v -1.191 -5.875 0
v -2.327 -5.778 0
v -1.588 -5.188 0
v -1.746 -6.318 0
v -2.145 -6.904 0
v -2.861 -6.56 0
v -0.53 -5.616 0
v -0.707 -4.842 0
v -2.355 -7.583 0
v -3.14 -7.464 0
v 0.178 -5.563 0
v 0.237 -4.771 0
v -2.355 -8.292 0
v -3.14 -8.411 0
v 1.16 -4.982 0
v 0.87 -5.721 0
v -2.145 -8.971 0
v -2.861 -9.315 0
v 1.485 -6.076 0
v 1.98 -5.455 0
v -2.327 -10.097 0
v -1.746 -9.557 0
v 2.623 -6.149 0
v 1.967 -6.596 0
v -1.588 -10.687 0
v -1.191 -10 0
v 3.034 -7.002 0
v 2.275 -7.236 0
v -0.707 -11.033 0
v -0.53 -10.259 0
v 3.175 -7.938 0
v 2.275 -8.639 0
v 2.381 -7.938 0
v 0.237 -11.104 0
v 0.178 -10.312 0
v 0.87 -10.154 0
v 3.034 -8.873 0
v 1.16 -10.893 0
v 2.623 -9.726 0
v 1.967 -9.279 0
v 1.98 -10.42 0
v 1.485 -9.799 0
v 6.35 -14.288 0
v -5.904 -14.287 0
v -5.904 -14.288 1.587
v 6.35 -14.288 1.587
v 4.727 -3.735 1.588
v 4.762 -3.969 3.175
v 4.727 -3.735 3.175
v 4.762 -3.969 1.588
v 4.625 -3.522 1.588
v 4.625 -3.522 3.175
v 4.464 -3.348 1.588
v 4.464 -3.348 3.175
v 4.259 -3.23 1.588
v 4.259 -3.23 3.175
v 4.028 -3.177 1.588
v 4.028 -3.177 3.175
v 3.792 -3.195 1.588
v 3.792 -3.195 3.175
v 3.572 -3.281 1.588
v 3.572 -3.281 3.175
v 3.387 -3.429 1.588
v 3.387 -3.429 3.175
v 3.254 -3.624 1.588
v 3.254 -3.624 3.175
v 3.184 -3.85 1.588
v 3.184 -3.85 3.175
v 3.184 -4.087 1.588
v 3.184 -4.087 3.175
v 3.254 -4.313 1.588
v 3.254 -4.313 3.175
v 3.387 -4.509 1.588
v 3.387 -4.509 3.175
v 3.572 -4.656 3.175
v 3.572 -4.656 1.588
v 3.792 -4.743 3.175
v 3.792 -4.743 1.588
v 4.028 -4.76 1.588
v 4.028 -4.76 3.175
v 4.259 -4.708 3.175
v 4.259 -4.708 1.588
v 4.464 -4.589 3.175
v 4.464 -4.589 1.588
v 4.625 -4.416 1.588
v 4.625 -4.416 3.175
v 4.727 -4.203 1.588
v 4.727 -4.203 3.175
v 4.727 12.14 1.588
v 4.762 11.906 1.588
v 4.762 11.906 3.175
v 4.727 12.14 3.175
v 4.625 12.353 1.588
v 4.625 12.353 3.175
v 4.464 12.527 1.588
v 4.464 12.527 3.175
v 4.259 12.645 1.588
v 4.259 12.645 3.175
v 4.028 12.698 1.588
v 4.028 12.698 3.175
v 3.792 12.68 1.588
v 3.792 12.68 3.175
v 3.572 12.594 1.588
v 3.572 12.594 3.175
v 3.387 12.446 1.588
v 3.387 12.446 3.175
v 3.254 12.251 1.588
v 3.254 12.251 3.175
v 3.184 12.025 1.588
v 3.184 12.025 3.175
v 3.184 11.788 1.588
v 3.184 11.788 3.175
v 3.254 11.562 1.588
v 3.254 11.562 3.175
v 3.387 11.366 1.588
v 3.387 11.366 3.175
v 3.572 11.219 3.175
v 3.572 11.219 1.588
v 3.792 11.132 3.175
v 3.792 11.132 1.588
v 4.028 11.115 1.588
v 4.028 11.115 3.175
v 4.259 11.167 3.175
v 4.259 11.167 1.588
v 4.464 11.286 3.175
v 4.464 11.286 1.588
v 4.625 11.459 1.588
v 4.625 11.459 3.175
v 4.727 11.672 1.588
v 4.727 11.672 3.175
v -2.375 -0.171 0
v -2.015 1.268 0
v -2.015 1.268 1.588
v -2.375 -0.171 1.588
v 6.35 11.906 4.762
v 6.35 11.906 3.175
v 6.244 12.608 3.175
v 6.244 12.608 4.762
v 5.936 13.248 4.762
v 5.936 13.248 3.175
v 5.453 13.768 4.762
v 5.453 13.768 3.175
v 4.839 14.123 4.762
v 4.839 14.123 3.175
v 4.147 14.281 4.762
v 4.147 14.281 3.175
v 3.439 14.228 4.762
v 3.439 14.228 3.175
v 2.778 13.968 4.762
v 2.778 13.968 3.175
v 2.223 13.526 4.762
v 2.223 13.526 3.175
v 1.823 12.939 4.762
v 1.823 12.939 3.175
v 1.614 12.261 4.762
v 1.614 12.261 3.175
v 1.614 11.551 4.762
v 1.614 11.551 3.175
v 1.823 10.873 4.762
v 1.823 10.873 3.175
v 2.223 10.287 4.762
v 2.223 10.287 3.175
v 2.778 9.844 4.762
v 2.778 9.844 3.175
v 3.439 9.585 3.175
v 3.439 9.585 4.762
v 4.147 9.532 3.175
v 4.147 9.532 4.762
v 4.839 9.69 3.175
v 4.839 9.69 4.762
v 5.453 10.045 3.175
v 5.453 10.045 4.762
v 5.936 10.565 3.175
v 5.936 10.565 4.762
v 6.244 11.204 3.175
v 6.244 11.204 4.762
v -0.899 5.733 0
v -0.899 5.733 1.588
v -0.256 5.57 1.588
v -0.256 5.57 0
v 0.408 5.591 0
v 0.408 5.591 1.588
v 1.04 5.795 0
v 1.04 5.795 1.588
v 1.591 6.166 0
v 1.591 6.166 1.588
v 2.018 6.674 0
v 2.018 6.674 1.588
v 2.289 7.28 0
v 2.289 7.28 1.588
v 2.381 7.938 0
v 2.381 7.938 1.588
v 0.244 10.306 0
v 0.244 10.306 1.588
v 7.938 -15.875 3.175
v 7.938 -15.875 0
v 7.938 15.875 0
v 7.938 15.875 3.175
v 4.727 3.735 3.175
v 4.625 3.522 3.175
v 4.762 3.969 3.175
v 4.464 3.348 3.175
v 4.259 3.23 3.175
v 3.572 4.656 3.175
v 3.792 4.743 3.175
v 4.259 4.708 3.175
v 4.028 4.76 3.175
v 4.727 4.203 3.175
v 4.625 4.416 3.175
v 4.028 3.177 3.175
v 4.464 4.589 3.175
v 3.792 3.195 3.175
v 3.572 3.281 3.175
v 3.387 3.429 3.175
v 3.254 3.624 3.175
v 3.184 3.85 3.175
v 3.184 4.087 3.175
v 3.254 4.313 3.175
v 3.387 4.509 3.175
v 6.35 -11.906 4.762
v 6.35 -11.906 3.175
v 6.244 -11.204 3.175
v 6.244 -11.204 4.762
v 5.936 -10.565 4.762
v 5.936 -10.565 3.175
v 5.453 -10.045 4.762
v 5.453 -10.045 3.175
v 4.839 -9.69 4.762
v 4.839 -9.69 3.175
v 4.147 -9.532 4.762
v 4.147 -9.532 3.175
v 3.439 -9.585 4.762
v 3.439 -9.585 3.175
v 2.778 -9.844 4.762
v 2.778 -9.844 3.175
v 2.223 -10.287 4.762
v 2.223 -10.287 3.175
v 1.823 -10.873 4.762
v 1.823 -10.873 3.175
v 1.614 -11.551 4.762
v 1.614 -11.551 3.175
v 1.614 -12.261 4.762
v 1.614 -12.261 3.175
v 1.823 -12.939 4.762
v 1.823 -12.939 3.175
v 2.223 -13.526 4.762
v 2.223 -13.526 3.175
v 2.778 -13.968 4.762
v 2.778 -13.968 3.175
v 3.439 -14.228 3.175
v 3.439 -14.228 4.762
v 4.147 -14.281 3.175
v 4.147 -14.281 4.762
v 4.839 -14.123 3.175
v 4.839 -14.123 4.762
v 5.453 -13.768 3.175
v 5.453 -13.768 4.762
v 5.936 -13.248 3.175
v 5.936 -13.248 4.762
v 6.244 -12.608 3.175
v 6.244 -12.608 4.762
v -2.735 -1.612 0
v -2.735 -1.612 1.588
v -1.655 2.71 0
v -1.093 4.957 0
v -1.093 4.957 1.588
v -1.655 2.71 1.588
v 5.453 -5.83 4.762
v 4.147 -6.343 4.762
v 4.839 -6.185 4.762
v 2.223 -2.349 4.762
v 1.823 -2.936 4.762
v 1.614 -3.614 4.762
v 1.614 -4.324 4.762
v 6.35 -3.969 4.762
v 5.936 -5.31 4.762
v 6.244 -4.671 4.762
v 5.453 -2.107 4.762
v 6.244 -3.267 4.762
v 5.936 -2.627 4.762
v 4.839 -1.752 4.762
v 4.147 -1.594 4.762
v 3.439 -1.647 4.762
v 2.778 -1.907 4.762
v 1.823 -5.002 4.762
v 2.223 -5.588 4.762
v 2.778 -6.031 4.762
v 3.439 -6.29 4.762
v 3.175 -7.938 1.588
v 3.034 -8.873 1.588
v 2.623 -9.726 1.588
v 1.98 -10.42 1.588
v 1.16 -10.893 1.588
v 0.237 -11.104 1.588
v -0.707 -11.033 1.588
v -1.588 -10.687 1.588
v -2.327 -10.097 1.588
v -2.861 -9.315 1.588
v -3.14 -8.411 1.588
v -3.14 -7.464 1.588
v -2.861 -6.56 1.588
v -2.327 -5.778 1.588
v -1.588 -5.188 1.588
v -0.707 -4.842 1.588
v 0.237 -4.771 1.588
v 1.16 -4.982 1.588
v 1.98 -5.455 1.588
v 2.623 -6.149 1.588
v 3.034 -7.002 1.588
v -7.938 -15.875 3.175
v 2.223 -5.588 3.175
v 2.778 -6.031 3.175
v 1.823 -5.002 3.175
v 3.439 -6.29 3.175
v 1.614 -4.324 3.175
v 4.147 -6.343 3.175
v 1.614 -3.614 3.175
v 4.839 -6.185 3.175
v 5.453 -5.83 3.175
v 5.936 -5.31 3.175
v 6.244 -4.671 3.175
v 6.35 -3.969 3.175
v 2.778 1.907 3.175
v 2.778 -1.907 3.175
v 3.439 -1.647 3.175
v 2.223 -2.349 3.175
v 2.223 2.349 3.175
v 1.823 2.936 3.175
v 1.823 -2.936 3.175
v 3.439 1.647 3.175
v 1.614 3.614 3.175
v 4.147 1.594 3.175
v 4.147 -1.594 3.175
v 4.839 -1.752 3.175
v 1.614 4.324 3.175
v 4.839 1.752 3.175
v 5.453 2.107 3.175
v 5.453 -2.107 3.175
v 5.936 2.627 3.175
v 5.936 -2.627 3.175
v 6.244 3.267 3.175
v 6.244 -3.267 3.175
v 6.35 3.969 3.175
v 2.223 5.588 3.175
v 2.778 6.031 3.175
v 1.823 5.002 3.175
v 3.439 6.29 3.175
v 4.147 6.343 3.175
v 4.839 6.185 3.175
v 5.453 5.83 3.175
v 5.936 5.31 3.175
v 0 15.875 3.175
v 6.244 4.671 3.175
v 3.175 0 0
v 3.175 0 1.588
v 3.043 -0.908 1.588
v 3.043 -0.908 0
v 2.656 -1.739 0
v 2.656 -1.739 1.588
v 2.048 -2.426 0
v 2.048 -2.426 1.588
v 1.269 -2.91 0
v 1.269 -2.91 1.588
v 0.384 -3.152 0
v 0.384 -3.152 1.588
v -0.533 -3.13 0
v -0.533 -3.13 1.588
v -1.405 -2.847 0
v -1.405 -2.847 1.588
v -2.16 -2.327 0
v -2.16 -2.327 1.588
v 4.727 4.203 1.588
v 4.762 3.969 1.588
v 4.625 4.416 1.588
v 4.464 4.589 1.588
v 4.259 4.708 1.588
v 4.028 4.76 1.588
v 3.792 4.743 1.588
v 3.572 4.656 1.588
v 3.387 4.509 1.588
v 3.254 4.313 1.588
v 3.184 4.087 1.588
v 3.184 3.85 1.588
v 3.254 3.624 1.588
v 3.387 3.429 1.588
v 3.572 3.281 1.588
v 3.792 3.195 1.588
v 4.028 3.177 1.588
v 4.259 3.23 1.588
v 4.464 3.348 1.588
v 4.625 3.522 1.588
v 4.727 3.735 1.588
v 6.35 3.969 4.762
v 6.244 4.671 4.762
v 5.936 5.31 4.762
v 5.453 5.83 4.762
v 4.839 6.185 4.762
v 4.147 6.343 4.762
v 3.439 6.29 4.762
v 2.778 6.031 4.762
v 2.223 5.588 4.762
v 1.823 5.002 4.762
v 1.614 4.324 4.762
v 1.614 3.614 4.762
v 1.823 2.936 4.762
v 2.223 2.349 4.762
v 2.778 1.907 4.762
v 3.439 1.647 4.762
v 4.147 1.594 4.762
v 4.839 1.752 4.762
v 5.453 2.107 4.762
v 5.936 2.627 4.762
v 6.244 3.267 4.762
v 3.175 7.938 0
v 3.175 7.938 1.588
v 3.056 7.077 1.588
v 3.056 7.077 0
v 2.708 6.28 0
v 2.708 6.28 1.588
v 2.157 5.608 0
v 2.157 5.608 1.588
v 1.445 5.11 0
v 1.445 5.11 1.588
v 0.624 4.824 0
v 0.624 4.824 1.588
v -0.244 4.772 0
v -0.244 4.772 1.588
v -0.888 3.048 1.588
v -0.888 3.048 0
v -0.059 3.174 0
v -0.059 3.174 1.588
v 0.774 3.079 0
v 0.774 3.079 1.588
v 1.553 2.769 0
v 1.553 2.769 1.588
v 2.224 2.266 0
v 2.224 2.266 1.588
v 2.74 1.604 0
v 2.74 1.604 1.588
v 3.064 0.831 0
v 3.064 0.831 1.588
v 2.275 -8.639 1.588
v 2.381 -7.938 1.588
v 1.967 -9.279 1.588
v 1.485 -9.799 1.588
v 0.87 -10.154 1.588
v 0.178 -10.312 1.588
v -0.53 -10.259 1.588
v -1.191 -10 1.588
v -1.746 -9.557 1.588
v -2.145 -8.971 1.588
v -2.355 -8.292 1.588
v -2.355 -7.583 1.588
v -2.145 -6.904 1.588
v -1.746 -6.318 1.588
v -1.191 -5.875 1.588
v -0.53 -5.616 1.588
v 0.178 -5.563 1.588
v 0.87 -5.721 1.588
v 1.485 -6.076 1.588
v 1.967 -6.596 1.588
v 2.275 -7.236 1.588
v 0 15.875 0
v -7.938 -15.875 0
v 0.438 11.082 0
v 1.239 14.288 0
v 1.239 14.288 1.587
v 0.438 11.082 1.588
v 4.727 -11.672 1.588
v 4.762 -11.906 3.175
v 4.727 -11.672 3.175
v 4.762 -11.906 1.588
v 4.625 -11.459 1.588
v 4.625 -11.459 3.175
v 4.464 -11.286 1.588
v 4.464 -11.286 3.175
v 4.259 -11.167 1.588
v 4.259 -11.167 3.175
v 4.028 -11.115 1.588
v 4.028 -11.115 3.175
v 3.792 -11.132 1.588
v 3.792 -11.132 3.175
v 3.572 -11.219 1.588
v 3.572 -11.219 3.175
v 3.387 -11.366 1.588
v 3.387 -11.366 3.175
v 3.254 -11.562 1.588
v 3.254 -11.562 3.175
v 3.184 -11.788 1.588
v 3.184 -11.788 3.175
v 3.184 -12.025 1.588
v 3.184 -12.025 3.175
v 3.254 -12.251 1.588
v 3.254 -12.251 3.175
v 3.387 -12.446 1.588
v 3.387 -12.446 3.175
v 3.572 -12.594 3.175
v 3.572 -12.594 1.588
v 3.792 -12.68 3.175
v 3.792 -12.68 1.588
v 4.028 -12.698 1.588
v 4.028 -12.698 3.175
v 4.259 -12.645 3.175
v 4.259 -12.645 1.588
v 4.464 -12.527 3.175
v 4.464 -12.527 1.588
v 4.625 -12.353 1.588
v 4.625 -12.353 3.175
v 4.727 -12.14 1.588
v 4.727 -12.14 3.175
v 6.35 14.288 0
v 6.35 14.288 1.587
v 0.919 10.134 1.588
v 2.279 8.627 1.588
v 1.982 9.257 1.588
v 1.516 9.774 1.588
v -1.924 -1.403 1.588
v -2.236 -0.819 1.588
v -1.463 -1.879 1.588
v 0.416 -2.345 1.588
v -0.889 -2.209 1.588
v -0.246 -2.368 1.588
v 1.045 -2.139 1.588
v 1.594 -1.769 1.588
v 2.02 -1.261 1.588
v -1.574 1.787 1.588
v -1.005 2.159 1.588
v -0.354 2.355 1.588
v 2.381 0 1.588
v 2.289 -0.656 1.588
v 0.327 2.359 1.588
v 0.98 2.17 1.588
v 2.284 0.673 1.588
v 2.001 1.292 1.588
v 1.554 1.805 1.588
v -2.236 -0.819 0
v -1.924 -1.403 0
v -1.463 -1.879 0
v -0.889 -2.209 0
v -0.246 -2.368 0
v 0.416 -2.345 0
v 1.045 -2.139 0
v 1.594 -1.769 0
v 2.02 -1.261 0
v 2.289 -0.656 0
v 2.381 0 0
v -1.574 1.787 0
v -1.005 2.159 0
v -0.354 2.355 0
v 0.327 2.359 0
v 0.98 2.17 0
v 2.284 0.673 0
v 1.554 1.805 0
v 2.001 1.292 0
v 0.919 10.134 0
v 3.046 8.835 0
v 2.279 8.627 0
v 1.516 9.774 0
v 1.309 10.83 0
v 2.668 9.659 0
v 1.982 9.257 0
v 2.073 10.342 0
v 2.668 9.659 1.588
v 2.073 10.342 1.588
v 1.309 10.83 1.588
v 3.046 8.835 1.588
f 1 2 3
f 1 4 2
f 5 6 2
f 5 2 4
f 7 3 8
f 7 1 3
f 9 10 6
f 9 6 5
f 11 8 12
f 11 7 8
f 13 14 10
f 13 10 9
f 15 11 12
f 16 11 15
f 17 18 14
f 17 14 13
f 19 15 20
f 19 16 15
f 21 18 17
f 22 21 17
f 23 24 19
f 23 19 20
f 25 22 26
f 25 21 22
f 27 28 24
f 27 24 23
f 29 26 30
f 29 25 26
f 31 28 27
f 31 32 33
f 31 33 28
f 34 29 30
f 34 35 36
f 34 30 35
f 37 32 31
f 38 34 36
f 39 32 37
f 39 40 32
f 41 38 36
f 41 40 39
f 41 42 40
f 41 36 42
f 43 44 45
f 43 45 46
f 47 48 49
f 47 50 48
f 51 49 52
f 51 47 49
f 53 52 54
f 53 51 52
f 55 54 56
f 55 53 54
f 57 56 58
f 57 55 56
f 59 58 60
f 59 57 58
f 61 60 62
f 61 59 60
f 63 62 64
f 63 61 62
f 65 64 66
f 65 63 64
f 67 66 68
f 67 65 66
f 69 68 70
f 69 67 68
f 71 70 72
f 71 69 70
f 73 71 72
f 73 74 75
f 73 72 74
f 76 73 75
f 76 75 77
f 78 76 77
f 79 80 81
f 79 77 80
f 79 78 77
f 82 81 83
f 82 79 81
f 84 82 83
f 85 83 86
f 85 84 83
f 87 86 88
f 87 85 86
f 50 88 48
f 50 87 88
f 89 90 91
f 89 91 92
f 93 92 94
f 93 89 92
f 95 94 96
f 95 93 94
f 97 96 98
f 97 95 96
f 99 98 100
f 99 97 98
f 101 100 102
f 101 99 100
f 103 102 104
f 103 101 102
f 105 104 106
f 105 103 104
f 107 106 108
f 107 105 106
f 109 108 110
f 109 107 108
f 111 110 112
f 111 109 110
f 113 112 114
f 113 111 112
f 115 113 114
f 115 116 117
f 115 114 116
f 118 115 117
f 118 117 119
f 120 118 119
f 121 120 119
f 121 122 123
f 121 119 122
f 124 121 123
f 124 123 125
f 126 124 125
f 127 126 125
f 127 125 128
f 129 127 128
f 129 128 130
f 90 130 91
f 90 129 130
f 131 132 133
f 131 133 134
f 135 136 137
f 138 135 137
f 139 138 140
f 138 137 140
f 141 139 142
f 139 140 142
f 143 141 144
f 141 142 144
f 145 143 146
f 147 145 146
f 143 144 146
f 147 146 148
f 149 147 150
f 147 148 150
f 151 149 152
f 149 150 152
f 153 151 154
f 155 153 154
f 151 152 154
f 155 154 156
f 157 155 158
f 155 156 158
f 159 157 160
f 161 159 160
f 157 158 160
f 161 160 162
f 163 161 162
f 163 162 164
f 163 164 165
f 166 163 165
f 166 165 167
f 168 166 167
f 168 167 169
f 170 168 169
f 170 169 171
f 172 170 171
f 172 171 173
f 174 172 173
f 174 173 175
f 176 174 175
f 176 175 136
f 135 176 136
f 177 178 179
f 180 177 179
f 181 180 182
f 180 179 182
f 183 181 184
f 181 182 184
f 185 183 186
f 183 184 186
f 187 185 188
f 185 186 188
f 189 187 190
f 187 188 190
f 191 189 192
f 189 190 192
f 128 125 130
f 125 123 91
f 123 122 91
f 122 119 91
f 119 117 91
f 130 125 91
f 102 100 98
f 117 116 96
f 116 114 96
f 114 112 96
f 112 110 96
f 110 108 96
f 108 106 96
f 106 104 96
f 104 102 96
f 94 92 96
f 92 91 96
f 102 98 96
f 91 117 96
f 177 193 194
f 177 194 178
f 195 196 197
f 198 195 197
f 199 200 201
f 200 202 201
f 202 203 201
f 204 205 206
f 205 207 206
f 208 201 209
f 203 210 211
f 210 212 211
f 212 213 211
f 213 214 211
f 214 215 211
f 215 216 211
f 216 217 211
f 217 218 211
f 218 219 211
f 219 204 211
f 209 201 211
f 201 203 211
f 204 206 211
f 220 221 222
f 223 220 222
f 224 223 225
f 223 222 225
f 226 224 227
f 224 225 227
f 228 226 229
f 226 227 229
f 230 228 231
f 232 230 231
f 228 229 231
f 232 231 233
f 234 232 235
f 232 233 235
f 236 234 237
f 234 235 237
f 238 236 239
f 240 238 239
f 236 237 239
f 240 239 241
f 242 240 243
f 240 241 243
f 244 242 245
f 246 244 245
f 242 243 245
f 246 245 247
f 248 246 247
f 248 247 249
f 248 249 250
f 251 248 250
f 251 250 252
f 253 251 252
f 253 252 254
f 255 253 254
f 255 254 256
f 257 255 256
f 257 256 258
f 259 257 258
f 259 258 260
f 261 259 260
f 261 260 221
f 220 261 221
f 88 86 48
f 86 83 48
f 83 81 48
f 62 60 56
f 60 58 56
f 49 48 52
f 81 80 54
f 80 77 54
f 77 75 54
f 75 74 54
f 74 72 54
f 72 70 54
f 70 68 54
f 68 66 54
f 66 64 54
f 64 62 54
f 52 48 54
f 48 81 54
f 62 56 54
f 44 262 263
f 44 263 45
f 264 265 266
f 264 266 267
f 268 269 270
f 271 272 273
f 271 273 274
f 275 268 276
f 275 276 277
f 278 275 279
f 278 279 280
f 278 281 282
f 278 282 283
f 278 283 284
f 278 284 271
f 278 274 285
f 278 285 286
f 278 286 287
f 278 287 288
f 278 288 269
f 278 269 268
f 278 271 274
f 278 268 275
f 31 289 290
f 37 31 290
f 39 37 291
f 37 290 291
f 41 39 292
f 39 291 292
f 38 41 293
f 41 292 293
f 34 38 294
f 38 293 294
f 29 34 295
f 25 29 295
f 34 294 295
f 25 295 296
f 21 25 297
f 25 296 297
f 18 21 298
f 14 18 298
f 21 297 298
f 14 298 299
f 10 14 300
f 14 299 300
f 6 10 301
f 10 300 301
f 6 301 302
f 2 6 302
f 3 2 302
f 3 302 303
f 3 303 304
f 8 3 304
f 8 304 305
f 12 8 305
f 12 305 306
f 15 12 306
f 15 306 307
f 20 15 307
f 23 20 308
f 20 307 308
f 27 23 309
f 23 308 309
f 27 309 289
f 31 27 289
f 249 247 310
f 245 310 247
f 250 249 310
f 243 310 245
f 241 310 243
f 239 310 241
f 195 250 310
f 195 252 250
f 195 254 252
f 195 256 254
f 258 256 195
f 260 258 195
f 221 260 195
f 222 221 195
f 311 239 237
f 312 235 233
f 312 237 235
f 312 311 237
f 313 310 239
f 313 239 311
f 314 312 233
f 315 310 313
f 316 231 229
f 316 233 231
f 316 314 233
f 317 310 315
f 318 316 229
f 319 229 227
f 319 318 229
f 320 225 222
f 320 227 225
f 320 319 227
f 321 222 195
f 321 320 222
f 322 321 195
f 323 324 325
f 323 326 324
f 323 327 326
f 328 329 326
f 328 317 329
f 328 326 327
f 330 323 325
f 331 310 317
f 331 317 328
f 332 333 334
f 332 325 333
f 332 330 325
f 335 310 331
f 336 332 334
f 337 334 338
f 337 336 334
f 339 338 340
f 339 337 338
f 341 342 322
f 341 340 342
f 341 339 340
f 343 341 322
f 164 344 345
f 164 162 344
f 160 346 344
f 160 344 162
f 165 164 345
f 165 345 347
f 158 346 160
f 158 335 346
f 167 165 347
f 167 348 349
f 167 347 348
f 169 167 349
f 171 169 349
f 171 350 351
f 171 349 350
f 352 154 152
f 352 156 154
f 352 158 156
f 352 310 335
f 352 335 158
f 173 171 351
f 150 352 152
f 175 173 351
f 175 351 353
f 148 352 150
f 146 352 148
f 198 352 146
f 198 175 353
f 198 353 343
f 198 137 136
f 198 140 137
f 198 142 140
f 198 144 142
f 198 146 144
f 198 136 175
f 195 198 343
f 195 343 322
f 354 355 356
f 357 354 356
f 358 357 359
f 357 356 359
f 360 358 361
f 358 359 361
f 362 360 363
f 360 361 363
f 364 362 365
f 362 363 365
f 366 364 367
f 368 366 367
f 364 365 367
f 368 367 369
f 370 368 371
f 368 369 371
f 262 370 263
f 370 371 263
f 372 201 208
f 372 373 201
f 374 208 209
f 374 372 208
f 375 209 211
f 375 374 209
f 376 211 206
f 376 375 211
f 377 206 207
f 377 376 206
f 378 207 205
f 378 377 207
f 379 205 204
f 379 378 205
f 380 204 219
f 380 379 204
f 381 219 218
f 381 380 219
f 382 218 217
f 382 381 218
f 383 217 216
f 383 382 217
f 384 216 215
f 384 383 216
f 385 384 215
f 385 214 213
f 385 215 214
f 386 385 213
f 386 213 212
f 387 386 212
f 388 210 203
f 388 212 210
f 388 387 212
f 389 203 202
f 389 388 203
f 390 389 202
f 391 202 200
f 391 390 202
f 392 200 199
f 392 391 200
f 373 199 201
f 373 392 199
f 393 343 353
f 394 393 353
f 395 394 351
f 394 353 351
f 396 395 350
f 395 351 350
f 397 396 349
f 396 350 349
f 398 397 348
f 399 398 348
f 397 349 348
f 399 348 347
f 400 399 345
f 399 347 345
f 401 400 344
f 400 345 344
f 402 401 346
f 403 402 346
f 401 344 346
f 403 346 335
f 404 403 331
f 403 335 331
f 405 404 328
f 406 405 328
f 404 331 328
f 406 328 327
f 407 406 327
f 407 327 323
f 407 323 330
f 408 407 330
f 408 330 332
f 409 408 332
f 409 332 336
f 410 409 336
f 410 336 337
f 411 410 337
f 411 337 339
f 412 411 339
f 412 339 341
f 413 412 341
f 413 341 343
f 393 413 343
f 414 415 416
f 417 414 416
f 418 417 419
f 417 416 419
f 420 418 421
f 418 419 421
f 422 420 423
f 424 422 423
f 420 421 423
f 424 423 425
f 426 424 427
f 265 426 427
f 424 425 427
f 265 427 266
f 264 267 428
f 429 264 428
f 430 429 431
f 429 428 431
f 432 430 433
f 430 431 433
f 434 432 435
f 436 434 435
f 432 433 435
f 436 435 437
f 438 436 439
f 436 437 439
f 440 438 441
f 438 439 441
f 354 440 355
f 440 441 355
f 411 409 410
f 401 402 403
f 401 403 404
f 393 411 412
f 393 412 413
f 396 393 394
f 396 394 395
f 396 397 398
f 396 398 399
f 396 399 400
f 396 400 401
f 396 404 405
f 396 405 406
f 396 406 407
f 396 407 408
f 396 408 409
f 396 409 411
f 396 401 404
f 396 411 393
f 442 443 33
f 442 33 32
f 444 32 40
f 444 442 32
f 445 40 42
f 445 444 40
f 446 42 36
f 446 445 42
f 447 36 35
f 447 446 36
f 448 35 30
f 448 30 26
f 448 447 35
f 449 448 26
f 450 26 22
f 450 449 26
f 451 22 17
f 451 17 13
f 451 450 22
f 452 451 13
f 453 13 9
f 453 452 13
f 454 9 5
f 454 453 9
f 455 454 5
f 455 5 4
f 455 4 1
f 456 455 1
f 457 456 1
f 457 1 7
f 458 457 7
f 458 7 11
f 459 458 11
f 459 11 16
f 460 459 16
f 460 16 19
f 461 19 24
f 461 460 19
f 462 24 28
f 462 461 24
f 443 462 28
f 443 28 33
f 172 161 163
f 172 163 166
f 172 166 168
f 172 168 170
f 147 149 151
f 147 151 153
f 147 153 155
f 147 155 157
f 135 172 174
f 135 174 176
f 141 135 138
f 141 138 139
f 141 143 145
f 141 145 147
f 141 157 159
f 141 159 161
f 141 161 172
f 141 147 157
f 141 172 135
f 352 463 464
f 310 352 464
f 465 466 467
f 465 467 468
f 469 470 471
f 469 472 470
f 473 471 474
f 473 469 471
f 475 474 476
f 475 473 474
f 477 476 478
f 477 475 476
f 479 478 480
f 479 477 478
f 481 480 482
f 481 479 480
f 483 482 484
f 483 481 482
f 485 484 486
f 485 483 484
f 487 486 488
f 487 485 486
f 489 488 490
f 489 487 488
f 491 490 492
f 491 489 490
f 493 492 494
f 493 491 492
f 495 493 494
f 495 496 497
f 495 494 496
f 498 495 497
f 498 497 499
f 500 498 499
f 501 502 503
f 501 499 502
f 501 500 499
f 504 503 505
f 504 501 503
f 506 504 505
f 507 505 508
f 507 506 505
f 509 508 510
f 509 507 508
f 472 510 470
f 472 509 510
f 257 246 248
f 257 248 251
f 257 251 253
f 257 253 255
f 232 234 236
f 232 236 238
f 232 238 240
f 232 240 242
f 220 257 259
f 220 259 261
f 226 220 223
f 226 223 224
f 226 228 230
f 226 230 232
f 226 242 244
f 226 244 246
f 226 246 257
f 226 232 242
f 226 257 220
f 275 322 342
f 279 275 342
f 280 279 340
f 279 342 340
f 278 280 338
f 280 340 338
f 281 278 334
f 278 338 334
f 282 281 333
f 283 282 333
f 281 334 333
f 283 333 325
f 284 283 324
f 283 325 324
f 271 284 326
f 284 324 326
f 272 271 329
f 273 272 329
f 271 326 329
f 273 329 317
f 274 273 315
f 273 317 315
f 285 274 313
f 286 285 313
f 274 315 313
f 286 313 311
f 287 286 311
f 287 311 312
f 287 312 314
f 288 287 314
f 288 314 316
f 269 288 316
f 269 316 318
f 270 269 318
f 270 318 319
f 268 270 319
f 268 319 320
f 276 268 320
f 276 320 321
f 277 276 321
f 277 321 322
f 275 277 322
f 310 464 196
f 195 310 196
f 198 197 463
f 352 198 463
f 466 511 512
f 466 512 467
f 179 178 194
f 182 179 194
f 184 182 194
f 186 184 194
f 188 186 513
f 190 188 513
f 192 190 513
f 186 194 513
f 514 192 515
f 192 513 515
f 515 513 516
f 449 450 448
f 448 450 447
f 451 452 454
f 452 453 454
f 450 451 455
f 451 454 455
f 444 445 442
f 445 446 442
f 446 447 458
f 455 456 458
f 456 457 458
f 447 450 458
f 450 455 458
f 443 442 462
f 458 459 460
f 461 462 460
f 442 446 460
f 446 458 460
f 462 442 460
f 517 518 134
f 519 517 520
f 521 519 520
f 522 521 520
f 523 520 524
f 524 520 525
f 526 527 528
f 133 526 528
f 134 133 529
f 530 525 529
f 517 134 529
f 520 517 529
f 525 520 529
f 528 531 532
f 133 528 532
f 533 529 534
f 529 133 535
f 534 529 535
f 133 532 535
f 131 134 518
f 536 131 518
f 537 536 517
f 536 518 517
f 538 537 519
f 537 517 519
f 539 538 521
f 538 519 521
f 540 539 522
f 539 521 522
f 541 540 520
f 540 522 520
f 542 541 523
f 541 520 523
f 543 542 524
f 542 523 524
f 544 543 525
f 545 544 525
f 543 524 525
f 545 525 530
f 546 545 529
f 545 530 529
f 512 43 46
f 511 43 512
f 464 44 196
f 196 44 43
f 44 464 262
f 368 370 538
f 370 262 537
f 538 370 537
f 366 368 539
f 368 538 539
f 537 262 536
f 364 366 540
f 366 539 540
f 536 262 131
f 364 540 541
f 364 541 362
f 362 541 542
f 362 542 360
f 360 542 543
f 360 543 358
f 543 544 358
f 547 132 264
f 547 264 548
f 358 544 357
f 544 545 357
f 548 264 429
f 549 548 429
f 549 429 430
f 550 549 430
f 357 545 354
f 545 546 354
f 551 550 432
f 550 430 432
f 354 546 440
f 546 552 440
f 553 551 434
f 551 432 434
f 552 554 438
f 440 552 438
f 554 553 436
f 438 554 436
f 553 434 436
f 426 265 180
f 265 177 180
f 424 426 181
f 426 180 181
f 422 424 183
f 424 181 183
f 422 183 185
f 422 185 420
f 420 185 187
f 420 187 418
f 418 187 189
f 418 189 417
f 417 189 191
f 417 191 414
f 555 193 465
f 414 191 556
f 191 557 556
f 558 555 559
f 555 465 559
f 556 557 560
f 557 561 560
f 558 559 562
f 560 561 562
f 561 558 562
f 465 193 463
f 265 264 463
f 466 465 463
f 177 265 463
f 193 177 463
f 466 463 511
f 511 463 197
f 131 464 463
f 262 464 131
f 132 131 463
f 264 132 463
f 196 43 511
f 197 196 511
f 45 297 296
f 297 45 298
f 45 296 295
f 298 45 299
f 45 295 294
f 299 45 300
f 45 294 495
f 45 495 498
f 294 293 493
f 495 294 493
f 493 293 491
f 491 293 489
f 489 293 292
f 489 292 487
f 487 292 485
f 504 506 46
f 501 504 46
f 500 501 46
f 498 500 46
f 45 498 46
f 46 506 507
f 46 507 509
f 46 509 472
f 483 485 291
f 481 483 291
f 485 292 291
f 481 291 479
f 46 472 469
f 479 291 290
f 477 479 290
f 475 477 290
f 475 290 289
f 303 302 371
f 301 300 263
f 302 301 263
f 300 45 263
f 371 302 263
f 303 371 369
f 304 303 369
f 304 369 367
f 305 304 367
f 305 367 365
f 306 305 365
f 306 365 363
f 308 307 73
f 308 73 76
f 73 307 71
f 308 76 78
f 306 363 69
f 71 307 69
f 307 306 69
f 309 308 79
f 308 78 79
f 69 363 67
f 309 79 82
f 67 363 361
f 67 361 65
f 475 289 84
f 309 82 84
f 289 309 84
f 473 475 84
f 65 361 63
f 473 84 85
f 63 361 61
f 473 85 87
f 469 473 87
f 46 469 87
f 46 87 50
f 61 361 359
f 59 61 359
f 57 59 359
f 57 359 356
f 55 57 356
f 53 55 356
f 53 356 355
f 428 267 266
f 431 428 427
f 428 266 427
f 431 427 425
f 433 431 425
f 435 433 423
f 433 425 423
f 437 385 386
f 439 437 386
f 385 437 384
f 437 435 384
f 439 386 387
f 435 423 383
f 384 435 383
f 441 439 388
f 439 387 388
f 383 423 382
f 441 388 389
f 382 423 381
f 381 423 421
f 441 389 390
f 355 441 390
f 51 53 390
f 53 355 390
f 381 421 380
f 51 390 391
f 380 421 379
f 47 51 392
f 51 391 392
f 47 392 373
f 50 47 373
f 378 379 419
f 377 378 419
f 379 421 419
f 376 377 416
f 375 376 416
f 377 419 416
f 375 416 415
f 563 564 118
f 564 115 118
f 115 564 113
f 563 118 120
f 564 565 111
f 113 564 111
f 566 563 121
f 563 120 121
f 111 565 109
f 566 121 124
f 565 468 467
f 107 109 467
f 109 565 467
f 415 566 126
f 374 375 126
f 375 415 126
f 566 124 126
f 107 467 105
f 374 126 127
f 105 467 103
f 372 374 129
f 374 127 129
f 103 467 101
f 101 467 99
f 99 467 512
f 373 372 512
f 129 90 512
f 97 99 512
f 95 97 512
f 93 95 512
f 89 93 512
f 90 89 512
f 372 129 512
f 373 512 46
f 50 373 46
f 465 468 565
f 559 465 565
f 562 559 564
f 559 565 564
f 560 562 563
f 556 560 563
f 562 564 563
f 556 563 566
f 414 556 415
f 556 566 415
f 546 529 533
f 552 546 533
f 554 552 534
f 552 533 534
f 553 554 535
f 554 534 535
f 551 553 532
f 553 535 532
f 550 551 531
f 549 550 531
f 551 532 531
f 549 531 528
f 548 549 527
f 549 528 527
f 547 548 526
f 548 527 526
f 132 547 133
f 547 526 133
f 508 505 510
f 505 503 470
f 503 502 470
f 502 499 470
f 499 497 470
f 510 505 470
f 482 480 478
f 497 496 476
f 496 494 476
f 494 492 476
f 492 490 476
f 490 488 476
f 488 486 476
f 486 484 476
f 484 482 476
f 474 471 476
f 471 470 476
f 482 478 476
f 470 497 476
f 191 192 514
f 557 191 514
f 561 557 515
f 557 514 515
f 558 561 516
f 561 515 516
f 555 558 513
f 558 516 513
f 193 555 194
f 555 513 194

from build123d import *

# Parameters (mm, degrees)
F0_R     = 2.38125
F1_DEPTH = 3.175
F2_DEPTH = 4.7625
F3_T     = -1.5875
F4_R     = 3.175
F4_R_2   = 2.38125
F5_DEPTH = 1.5875


with BuildPart() as f1:
    # F0 (on Top) → F1 (new body)
    with BuildSketch(Plane.XY):
        Polygon((7.9375, 15.875), (0, 15.875), (-7.9375, -15.875), (7.9375, -15.875), align=None)
        with Locations((3.96875, -11.90625)):
            Circle(F0_R, mode=Mode.SUBTRACT)
        with Locations((3.96875, -3.96875)):
            Circle(F0_R, mode=Mode.SUBTRACT)
        with Locations((3.96875, 3.96875)):
            Circle(F0_R, mode=Mode.SUBTRACT)
        with Locations((3.96875, 11.90625)):
            Circle(F0_R, mode=Mode.SUBTRACT)
    extrude(amount=F1_DEPTH)

    # F0 (on Top) → F2 (join)
    with BuildSketch(Plane.XY):
        with Locations((3.96875, 11.90625)):
            Circle(F0_R)
        with Locations((3.96875, 3.96875)):
            Circle(F0_R)
        with Locations((3.96875, -3.96875)):
            Circle(F0_R)
        with Locations((3.96875, -11.90625)):
            Circle(F0_R)
    extrude(amount=F2_DEPTH)

    # F3
    f3_openings = [f1.faces().sort_by_distance(p)[0] for p in [
        (1.763889, -1.763889, 0),
    ]]
    offset(amount=F3_T, openings=f3_openings, kind=Kind.INTERSECTION)

    # F4 (on face) → F5 (join)
    with BuildSketch(Plane(origin=(0, 0, 1.5875), x_dir=(1, 0, 0), z_dir=(0, 0, -1))):
        with BuildLine():
            ThreePointArc((0.4381385265, -11.0821239253), (2.3949650124, -10.0219106095), (3.175, -7.9375))
            ThreePointArc((3.175, -7.9375), (1.8179135149, -5.3344603437), (-1.0932302062, -4.9566489946))
            Line((-1.0932302062, -4.9566489946), (-0.8992491716, -5.7325731328))
            ThreePointArc((-0.8992491716, -5.7325731328), (1.3283475585, -5.9611790933), (2.38125, -7.9375))
            ThreePointArc((2.38125, -7.9375), (1.7680146479, -9.5326413001), (0.244157492, -10.3061997871))
            Line((0.244157492, -10.3061997871), (0.4381385265, -11.0821239253))
        make_face()
        with BuildLine():
            Line((-2.0152745824, -1.2684714896), (-1.6550091801, -2.7095330988))
            ThreePointArc((-1.6550091801, -2.7095330988), (1.5533787132, -2.7690503017), (3.175, 0))
            ThreePointArc((3.175, 0), (0.8354053628, 3.0631230599), (-2.7353766172, 1.6119366495))
            Line((-2.7353766172, 1.6119366495), (-2.3751112149, 0.1708750402))
            ThreePointArc((-2.3751112149, 0.1708750402), (0.0854926372, 2.3797148089), (2.38125, 0))
            ThreePointArc((2.38125, 0), (0.6601056594, -2.2879274641), (-2.0152745824, -1.2684714896))
        make_face()
        with Locations((0, 7.9375)):
            Circle(F4_R)
        with Locations((0, 7.9375)):
            Circle(F4_R_2, mode=Mode.SUBTRACT)
    extrude(amount=F5_DEPTH)


solid = f1.part
